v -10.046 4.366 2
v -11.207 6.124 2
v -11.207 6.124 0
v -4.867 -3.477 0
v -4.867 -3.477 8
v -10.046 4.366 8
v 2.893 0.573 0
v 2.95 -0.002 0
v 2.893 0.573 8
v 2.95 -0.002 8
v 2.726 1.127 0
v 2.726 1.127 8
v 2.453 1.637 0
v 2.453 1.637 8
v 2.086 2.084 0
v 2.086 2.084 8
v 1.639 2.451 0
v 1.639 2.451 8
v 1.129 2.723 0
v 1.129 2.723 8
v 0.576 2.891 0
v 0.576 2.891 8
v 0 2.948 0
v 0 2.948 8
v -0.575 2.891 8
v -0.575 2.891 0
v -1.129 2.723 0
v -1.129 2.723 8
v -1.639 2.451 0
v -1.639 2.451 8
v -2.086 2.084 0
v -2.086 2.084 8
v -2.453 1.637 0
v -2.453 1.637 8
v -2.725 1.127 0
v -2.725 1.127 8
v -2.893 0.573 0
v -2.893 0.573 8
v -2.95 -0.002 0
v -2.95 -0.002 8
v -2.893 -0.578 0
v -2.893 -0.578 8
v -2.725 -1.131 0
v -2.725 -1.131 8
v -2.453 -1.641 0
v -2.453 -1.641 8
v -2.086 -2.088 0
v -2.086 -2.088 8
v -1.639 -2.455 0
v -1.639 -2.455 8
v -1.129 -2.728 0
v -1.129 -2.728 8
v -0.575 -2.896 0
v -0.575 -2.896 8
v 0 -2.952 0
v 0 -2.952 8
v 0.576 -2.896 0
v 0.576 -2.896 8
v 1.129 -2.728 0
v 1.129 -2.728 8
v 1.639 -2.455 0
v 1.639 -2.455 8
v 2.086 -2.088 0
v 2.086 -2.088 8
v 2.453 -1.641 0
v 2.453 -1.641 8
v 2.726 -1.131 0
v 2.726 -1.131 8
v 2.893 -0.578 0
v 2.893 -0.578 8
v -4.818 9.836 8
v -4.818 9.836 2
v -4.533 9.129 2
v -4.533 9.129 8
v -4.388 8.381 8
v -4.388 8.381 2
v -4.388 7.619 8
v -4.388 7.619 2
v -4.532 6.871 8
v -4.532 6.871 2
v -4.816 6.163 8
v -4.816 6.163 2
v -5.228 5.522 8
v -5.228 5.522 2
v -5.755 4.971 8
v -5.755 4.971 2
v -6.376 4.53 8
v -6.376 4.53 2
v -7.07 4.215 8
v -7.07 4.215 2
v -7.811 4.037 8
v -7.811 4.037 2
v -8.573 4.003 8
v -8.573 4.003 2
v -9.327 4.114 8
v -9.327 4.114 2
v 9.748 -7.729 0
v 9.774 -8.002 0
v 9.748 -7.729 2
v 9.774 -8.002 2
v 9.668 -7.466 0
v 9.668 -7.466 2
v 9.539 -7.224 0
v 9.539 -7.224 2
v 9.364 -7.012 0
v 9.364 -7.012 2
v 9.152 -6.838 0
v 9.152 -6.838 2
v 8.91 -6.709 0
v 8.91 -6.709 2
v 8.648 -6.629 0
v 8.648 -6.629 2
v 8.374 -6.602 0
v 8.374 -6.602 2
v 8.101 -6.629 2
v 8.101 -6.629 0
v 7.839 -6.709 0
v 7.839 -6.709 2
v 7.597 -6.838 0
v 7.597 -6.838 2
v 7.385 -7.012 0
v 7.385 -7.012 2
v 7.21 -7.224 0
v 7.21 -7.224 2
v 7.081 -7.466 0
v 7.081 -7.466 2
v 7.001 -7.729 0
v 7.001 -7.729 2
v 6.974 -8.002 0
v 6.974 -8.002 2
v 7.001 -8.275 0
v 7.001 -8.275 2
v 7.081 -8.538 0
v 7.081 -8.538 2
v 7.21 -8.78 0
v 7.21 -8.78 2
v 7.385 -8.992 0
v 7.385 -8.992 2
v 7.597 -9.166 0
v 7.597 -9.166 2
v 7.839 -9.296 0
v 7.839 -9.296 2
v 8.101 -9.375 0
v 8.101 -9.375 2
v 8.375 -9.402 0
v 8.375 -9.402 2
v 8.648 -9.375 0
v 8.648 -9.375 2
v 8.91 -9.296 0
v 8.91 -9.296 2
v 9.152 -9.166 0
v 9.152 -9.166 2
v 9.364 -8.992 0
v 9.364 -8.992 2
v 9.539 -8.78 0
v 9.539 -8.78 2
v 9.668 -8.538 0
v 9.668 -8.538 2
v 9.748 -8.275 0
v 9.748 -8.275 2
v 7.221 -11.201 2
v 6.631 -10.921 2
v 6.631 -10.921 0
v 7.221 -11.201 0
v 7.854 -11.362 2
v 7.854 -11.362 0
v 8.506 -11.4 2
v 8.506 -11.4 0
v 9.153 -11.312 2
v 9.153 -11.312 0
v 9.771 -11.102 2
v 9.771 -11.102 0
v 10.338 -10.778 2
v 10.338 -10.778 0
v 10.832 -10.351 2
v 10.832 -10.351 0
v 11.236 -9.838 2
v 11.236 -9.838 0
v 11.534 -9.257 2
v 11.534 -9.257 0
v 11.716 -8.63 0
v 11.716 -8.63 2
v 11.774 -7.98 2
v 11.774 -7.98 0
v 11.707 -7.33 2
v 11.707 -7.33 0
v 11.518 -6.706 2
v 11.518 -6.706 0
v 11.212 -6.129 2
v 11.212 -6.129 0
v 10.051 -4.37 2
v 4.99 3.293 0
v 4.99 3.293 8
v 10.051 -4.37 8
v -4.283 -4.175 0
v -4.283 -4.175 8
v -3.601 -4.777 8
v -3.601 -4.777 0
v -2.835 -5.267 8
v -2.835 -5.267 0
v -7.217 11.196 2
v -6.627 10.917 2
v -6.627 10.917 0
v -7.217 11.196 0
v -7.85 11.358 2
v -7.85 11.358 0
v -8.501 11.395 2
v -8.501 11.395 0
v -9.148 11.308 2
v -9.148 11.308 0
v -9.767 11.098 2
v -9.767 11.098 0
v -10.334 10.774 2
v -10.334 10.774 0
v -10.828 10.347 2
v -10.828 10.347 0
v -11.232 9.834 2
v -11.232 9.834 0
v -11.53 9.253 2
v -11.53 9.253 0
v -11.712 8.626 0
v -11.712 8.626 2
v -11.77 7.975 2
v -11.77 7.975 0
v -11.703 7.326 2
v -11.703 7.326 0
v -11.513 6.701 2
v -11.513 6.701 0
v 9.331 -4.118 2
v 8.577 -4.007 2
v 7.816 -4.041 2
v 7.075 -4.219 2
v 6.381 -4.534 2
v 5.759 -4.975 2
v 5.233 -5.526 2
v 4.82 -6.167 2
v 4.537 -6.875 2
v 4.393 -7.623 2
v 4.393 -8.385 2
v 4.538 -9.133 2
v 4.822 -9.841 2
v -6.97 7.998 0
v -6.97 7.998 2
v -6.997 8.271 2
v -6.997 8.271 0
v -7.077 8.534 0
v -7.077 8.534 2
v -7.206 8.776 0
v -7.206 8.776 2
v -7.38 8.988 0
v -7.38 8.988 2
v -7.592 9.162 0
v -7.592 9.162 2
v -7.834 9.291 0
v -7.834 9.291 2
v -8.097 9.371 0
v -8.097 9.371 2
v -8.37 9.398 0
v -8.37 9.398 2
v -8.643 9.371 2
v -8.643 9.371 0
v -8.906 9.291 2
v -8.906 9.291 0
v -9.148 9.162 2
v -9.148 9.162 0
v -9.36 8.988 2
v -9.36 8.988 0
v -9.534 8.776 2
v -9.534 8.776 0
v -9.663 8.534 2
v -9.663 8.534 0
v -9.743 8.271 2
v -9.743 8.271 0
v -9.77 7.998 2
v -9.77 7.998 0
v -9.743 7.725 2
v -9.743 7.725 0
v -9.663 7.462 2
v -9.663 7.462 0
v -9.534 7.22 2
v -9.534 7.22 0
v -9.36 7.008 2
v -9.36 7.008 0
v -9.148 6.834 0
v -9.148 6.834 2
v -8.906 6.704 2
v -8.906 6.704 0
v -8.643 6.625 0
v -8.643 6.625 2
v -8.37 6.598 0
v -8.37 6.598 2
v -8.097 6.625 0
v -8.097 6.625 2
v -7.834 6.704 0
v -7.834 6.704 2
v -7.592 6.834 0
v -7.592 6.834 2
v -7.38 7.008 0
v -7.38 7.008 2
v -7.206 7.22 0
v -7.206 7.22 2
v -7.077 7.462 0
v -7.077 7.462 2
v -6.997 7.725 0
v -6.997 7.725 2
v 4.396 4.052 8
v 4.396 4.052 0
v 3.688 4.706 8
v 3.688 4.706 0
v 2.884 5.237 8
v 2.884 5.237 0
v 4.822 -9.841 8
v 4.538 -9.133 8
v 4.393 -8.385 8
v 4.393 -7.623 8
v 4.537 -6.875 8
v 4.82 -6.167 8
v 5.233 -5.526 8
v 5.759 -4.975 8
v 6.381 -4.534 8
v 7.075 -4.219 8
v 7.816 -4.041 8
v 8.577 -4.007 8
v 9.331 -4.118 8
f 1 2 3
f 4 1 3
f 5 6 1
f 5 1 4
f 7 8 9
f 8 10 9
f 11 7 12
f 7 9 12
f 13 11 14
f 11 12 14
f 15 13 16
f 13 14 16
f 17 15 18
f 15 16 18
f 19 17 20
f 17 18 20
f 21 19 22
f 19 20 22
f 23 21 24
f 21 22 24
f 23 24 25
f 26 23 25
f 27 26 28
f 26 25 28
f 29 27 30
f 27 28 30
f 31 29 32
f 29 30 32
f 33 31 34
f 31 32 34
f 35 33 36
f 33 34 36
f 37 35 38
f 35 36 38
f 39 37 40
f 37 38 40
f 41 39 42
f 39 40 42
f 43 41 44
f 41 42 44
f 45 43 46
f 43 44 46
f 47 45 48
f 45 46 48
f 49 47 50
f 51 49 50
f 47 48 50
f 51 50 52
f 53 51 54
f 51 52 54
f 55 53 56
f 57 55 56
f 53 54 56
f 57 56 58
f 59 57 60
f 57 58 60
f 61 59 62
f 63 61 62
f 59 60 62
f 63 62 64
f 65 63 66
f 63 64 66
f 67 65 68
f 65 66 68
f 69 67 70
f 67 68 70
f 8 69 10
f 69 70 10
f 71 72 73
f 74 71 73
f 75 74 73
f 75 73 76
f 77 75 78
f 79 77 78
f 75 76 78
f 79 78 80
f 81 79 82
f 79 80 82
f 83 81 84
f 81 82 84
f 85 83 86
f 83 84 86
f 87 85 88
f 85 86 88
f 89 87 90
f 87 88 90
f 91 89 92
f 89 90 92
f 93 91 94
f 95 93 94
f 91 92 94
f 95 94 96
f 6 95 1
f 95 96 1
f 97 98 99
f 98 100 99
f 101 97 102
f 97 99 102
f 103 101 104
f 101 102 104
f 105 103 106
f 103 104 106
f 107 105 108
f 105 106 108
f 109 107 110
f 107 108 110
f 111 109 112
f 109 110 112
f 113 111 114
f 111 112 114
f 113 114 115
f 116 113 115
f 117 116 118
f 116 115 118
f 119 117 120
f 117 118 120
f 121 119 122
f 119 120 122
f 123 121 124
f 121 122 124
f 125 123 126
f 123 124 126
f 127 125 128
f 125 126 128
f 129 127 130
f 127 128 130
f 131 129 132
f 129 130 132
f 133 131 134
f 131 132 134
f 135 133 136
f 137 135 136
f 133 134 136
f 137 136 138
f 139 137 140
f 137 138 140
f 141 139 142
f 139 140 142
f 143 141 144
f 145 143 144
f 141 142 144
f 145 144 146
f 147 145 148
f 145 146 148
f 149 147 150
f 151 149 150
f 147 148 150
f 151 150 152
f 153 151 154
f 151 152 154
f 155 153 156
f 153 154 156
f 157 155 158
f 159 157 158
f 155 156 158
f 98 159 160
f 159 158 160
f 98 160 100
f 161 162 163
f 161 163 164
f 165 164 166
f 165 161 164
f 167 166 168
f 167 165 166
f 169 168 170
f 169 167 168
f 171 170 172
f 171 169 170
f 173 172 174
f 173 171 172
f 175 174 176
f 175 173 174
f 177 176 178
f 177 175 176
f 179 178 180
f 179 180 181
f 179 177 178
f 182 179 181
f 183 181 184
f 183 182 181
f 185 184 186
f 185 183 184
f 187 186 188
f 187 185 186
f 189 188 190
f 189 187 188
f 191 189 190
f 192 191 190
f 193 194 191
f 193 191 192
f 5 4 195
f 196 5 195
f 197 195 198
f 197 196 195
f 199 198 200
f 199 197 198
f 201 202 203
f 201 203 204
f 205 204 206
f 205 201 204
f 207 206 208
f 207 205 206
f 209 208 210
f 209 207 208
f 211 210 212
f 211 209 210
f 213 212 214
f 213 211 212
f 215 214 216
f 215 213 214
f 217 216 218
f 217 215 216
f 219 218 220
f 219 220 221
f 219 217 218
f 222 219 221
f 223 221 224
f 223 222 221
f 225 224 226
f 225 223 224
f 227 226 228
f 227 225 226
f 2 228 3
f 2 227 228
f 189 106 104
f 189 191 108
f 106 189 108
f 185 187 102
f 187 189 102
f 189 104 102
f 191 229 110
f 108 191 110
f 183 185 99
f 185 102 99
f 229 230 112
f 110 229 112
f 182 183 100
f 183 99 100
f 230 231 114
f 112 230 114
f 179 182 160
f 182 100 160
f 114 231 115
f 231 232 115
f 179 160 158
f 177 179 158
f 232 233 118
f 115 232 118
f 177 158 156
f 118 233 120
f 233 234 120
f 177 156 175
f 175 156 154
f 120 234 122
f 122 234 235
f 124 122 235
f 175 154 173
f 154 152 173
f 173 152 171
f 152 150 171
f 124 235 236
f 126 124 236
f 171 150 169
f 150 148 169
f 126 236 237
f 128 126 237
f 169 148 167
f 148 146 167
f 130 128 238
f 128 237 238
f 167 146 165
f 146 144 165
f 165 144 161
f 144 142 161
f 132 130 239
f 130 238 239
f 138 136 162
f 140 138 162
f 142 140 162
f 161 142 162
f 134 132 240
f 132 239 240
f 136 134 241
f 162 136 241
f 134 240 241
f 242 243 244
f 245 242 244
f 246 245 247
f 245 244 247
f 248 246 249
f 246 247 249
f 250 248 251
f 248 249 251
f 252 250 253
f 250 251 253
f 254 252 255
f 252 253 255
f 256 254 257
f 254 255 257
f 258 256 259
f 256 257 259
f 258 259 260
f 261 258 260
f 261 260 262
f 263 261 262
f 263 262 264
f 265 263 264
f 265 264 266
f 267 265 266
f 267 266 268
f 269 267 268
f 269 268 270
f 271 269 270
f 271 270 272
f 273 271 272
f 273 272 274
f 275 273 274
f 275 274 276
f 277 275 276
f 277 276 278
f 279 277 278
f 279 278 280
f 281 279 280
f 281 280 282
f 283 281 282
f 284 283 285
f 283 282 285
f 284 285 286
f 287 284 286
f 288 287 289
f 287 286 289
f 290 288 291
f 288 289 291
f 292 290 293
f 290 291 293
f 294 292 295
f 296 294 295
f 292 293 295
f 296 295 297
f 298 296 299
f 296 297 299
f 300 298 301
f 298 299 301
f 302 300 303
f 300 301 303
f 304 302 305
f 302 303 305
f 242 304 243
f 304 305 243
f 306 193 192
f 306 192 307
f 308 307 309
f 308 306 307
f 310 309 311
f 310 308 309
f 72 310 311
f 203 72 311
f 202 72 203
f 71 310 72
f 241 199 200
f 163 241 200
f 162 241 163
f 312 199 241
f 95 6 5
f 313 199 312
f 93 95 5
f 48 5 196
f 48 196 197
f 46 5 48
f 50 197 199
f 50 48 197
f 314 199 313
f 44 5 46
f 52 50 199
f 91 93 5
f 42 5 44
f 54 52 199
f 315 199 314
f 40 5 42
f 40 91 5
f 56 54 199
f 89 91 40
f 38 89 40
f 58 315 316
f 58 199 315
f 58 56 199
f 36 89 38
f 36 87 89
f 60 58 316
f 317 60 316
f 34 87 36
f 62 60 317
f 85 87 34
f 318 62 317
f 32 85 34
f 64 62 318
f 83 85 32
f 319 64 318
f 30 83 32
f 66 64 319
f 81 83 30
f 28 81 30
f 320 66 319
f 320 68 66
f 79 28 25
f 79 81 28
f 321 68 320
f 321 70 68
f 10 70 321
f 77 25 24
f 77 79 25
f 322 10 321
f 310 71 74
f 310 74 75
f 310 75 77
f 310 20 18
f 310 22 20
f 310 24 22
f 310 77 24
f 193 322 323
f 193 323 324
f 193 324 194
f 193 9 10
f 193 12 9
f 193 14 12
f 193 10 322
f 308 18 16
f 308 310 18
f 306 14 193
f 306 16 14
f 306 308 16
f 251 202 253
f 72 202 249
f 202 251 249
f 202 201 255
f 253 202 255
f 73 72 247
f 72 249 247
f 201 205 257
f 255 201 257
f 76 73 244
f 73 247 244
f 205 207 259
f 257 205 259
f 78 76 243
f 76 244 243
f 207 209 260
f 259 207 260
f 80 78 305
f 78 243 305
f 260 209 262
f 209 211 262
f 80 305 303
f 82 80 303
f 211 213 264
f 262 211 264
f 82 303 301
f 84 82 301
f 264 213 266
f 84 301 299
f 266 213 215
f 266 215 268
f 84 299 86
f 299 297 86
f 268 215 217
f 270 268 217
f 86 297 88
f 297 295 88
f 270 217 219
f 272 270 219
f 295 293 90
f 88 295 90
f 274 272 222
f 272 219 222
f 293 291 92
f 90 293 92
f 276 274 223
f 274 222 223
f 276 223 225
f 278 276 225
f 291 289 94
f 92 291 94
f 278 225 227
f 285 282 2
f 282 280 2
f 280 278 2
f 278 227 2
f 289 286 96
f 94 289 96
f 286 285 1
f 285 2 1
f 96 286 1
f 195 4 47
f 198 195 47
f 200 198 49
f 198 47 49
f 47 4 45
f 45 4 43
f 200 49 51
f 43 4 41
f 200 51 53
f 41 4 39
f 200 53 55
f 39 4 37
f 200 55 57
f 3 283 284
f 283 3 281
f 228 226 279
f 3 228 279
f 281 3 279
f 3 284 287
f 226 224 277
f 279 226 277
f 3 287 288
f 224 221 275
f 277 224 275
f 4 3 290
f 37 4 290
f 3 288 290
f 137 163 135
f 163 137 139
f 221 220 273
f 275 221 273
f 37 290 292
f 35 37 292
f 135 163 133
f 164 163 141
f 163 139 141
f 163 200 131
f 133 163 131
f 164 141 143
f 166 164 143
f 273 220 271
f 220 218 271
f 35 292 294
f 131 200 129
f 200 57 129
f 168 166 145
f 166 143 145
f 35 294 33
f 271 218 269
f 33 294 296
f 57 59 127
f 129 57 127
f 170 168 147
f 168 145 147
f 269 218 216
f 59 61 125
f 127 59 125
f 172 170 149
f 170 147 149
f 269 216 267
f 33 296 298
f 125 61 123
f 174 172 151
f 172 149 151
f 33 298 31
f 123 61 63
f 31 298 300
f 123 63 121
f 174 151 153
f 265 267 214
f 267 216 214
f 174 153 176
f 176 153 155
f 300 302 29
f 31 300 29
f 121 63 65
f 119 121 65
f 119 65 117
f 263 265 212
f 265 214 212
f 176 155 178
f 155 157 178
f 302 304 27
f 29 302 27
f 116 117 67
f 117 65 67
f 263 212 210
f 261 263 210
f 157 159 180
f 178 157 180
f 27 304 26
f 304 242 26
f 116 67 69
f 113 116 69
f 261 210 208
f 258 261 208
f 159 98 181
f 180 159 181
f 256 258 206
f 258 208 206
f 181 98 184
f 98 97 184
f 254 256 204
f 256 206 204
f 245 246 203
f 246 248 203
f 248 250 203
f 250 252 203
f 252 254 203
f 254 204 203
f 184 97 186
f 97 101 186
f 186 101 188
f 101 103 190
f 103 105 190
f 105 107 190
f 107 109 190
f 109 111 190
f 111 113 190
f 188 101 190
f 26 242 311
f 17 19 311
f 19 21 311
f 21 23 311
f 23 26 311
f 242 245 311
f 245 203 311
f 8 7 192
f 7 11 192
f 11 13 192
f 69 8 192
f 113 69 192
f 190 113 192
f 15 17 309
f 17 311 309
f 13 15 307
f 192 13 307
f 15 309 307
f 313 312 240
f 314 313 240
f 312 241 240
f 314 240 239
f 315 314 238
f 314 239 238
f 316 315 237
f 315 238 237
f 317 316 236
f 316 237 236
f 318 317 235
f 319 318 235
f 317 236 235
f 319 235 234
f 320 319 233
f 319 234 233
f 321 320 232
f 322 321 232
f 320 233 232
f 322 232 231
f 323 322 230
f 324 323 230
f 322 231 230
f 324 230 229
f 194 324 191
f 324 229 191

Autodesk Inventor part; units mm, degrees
ref_plane "YZ Plane" through (0, 0, 0) normal (1, 0, 0) x (0, 1, 0)
ref_plane "XZ Plane" through (0, 0, 0) normal (0, 1, 0) x (-1, 0, 0)
ref_plane "XY Plane" through (0, 0, 0) normal (0, 0, 1) x (1, 0, 0)
sketch "Skizze1" plane through (0, 0, 0) normal (0, 0, 1) x (1, 0, 0)
  circle A0 centre (0.0001, -0.0022) radius 3.9802 projected
  circle A1 centre (-8.37, 7.9978) radius 1.4 projected
  circle A2 centre (8.3745, -8.0022) radius 1.4 projected
  line L0 (-9.5383, 7.2264) -> (-3.2198, -2.3418)
  line L1 (-7.6522, 9.1998) -> (1.8915, 3.4999)
  line L2 (9.5428, -7.2307) -> (3.3215, 2.191)
  line L3 (-1.8517, -3.5253) -> (7.6567, -9.2041)
  point P0 (0, 0)
extrude "Extrusion1" add sketch "Skizze1" along normal blind 8
sketch "Skizze2" plane through (0, 0, 8) normal (0, 0, 1) x (1, 0, 0)
  arc A0 (-7.6522, 9.1998) -> (-9.5383, 7.2264) centre (-8.37, 7.9978) ccw projected
  line L0 (-9.5383, 7.2264) -> (-3.2198, -2.3418) projected
  arc A1 (-3.2198, -2.3418) -> (-1.8517, -3.5253) centre (0.0001, -0.0022) ccw projected
  line L1 (-1.8517, -3.5253) -> (7.6567, -9.2041) projected
  arc A2 (7.6567, -9.2041) -> (9.5428, -7.2307) centre (8.3745, -8.0022) ccw projected
  line L2 (9.5428, -7.2307) -> (3.3215, 2.191) projected
  arc A3 (3.3215, 2.191) -> (1.8915, 3.4999) centre (0.0001, -0.0022) ccw projected
  line L3 (1.8915, 3.4999) -> (-7.6522, 9.1998) projected
  arc A4 (-6.6267, 10.9169) -> (-11.2072, 6.1243) centre (-8.37, 7.9978) ccw
  line L4 (-11.2072, 6.1243) -> (-4.8666, -3.4774)
  arc A5 (-4.8666, -3.4774) -> (-2.8352, -5.2674) centre (0.0001, -0.0022) ccw
  line L5 (-2.8352, -5.2674) -> (6.6312, -10.9212)
  arc A6 (6.6312, -10.9212) -> (11.2118, -6.1287) centre (8.3745, -8.0022) ccw
  line L6 (11.2118, -6.1287) -> (4.9905, 3.2931)
  arc A7 (4.9905, 3.2931) -> (2.8837, 5.2369) centre (0.0001, -0.0022) ccw
  line L7 (2.8837, 5.2369) -> (-6.6267, 10.9169)
  point P0 (0, 0)
  dimension "d2" = 2
extrude "Extrusion2" add sketch "Skizze2" against normal up to surface (8 mm away)
sketch "Skizze3" plane through (0, 0, 8) normal (0, 0, 1) x (1, 0, 0)
  circle A0 centre (0.0001, -0.0022) radius 3.9802 projected
  circle A1 centre (-8.37, 7.9978) radius 1.4 projected
  circle A2 centre (8.3745, -8.0022) radius 1.4 projected
  circle A3 centre (0.0001, -0.0022) radius 2.95
  point P0 (0, 0)
  dimension "d5" = 5.9
extrude "Extrusion3" cut sketch "Skizze3" against normal through all contours A1 | A2 | A3
sketch "Skizze4" plane through (0, 0, 8) normal (0, 0, 1) x (1, 0, 0)
  circle A0 centre (-8.37, 7.9978) radius 1.4 projected
  circle A1 centre (8.3745, -8.0022) radius 1.4 projected
  point P0 (0, 0)
hole "Bohrung1" at (-8.37, 7.9978, 8) at (8.3745, -8.0022, 8) direction (0, 0, -1) diameter 2.8 end through all counterbore diameter 8 counterbore depth 6
properties part number "IM_Lensholder_small"
